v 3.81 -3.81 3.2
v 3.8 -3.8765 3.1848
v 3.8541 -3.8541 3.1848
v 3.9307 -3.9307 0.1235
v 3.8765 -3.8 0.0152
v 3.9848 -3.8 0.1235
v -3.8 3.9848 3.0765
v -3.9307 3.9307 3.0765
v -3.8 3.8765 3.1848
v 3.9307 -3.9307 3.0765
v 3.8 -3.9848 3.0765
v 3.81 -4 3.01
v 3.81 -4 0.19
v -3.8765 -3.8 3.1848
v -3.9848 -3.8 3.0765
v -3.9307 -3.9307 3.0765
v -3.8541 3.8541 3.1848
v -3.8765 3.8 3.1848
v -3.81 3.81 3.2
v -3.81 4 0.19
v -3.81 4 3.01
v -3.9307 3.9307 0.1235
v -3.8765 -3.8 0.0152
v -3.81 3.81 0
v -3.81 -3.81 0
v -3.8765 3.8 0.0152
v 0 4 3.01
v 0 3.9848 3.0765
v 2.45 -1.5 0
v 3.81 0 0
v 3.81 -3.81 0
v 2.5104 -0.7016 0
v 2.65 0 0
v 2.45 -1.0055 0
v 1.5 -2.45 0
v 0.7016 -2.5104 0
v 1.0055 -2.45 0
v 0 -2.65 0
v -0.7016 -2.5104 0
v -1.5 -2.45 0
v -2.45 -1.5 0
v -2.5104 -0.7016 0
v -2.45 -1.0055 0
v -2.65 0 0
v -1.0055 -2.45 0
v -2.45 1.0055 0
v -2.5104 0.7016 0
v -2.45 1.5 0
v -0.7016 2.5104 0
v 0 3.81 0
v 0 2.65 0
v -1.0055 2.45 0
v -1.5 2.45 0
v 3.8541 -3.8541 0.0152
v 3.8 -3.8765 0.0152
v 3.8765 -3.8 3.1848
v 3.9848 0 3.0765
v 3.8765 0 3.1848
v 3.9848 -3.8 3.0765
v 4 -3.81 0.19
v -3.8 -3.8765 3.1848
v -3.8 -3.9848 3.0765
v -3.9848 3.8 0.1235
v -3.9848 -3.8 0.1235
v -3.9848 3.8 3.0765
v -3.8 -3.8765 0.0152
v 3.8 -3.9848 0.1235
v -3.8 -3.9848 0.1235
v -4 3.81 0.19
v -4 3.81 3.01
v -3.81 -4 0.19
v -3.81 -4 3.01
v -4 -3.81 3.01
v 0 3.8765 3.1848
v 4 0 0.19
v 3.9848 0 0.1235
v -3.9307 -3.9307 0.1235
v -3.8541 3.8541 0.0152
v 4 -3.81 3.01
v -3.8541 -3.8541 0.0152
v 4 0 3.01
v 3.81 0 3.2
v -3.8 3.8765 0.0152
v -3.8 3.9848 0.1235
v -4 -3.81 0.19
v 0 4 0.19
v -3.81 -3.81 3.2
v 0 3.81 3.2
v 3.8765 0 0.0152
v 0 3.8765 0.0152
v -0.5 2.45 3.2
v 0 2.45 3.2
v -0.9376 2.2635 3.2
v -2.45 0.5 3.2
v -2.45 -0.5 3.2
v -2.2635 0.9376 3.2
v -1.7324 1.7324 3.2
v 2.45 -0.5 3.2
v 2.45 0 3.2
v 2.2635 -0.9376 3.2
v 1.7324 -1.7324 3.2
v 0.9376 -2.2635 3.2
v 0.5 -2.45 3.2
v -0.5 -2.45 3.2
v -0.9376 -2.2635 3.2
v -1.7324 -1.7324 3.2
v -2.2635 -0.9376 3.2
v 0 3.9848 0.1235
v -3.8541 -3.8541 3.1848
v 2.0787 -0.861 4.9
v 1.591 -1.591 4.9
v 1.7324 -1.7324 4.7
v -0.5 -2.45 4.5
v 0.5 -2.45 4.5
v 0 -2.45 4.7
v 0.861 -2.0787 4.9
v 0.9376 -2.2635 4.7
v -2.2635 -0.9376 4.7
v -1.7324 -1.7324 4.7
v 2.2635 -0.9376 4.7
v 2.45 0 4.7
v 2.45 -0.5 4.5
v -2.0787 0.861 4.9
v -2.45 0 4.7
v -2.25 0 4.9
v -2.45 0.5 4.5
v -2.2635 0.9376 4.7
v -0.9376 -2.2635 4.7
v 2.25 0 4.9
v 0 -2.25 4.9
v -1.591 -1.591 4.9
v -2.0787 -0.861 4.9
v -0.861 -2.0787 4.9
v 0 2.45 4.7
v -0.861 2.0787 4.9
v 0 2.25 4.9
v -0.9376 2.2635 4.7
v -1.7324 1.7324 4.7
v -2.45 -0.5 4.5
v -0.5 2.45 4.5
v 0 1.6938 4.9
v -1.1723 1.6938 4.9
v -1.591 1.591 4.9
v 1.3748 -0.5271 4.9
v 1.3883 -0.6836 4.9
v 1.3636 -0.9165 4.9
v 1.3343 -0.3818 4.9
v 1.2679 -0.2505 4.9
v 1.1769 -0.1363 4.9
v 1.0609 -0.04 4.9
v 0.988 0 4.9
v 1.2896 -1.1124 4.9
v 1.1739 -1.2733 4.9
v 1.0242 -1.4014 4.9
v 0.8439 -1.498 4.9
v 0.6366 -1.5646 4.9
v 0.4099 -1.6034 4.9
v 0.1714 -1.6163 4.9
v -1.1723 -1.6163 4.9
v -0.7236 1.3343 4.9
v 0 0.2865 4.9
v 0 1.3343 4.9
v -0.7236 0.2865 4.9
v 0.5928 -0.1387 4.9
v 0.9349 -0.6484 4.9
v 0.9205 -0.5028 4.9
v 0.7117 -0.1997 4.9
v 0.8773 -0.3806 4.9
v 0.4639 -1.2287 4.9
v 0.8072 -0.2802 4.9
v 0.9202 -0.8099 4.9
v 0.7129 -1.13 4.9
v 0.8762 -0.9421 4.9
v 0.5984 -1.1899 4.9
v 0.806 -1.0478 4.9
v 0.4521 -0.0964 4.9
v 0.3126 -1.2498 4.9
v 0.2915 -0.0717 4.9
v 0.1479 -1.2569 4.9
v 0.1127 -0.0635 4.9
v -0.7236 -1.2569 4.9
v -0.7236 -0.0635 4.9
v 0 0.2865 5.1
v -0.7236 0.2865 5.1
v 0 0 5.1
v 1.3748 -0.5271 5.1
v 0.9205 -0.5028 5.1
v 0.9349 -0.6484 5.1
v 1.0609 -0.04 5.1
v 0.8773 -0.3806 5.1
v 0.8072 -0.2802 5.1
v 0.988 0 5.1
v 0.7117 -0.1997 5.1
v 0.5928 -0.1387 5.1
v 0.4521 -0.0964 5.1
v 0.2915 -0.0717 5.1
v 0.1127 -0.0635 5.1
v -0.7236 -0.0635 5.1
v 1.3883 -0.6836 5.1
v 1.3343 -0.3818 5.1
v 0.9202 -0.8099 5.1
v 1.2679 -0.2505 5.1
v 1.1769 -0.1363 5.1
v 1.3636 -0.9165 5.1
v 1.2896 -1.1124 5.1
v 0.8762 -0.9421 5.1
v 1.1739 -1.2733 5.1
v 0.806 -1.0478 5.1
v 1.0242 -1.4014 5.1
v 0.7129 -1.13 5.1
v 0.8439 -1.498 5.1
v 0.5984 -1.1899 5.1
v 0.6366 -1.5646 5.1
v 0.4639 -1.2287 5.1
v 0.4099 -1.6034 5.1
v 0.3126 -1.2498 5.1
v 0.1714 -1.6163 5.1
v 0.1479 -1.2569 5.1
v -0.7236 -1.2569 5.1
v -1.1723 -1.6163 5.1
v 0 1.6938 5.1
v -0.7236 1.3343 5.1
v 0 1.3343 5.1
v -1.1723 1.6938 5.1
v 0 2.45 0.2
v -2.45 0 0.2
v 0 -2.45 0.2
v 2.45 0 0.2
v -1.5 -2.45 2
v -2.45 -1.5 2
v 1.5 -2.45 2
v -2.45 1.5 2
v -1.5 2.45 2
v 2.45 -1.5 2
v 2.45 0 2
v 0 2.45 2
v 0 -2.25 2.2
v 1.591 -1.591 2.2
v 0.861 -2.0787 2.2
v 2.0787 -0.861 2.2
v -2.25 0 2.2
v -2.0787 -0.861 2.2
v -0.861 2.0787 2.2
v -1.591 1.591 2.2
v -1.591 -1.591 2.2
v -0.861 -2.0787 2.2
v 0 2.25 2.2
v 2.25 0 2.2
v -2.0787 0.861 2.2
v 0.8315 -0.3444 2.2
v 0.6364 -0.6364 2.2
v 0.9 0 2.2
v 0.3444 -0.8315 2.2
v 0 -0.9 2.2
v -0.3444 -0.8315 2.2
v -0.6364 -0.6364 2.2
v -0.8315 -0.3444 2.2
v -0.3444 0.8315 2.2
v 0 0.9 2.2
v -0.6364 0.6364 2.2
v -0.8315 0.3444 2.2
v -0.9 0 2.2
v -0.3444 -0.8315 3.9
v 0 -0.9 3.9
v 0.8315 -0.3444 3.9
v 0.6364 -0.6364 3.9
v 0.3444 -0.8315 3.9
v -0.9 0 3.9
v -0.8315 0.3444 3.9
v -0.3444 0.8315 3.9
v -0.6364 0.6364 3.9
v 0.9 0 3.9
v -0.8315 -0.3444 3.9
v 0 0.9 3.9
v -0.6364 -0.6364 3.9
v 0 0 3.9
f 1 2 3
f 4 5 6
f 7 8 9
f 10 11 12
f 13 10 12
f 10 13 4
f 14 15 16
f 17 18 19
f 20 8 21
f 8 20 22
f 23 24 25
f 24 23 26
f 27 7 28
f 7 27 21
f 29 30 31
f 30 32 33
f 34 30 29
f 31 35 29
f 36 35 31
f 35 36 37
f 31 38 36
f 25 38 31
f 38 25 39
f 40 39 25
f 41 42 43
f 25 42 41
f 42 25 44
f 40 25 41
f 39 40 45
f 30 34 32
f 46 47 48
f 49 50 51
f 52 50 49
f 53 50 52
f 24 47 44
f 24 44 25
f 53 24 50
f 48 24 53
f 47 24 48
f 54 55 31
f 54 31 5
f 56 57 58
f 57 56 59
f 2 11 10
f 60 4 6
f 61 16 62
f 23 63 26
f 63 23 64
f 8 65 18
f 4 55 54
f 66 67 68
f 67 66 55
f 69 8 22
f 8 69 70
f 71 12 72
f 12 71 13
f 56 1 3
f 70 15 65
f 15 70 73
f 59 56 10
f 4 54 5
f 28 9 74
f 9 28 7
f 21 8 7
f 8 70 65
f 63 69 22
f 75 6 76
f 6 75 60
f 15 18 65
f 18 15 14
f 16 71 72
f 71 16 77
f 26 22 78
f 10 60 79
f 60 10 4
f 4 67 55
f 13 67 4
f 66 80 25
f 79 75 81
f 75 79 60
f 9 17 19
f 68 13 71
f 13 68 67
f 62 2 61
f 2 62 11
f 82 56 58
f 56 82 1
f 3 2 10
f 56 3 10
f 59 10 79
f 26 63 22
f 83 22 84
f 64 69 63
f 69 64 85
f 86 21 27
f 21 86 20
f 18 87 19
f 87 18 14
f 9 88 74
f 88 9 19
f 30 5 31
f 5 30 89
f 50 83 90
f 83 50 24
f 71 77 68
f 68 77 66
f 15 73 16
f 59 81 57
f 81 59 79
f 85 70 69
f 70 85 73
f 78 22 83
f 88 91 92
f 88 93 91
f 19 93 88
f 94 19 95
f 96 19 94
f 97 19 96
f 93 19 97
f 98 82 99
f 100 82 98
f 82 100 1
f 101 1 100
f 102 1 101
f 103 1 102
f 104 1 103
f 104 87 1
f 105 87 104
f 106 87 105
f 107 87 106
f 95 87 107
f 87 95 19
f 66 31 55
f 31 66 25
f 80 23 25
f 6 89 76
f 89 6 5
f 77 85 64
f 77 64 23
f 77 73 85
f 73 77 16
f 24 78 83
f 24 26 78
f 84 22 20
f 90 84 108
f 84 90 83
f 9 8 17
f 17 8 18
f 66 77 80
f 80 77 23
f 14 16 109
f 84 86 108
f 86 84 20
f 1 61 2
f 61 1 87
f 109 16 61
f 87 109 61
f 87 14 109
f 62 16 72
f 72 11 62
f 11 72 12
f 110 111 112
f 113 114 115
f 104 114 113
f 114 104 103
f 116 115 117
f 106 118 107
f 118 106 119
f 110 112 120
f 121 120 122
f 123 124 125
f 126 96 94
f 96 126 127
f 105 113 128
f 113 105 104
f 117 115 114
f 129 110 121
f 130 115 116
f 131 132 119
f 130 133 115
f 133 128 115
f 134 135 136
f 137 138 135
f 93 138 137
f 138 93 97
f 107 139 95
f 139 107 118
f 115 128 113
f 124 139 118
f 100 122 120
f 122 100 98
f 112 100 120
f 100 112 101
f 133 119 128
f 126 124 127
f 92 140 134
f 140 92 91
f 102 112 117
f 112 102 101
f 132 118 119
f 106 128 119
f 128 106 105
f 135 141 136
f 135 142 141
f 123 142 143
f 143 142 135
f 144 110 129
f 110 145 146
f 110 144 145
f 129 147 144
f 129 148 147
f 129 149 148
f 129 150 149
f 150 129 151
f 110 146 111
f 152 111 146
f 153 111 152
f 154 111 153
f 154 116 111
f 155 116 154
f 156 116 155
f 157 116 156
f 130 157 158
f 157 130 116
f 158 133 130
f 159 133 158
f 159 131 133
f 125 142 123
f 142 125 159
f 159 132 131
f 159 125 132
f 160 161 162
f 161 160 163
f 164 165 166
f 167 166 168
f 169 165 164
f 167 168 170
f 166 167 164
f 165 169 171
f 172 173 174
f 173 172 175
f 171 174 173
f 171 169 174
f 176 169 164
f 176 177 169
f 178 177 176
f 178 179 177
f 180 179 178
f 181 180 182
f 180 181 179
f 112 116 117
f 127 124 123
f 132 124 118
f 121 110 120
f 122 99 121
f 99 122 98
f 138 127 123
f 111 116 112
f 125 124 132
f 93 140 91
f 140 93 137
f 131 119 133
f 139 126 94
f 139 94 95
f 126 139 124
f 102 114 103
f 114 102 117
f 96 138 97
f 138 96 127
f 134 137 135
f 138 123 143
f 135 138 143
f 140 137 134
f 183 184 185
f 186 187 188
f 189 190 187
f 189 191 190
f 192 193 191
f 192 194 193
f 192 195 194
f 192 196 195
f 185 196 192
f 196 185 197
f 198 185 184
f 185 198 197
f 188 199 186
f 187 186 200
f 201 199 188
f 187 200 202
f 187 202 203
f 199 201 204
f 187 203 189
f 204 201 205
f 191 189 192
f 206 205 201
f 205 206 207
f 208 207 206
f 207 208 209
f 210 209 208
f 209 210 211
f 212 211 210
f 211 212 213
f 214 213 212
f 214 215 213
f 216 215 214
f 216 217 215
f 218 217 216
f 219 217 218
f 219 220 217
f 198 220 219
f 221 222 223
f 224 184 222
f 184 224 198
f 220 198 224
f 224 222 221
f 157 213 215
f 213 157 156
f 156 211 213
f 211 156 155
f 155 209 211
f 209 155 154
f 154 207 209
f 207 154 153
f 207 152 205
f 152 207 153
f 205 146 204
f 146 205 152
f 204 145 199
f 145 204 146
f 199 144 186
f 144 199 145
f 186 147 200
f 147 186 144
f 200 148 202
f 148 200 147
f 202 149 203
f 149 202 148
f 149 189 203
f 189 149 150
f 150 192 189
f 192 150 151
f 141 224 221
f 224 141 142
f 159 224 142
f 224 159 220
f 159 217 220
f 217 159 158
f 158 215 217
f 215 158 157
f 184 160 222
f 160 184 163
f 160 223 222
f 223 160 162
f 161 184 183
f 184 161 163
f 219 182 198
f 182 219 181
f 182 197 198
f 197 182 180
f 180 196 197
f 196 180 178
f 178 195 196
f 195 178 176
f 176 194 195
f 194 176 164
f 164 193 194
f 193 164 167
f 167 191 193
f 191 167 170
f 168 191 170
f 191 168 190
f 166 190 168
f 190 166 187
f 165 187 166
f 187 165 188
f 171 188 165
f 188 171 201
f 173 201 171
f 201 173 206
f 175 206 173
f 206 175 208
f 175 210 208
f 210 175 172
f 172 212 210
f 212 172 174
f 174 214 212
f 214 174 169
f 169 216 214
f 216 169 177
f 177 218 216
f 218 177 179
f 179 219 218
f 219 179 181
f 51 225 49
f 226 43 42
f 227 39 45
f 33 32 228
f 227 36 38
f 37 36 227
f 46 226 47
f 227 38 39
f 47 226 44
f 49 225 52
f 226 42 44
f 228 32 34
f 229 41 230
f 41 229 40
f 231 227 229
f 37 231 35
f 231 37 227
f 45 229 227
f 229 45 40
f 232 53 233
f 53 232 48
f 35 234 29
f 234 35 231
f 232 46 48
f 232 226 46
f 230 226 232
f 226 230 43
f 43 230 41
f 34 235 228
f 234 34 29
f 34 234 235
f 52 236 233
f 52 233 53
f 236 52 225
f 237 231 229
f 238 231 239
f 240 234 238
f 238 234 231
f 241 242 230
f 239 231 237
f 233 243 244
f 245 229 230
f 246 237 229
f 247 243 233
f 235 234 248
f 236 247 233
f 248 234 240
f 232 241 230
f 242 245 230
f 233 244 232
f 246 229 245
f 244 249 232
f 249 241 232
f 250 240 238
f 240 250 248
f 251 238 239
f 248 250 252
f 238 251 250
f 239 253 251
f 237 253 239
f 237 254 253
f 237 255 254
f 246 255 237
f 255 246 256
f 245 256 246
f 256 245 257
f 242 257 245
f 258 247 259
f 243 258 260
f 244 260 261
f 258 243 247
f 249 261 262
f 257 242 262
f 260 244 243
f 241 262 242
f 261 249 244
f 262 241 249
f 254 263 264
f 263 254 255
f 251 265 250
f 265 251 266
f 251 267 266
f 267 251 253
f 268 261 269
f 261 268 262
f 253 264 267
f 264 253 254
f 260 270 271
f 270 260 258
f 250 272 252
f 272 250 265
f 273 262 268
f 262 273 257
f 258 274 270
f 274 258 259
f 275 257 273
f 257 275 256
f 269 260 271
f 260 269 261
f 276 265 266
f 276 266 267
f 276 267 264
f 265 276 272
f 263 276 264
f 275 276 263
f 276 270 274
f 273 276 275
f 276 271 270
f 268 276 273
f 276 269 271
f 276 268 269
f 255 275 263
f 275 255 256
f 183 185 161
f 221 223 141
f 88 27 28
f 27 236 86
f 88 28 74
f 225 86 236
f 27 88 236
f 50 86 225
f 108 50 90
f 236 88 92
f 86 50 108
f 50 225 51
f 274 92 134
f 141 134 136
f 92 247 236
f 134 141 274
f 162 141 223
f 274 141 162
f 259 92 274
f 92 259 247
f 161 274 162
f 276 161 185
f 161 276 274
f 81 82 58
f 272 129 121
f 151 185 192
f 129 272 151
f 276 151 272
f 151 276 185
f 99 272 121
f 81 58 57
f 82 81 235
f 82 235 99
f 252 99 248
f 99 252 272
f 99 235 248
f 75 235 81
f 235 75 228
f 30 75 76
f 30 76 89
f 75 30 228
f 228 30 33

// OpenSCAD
// file: lcbm_corner_bevel.scad
// Lego Compatible Build Modules

module lcbm_corner_bevel(bevel=0.2,flat=0.0) {
    local_flat=(flat>0.0&&flat<=bevel)?flat:0.1*bevel;
    hull() {
        sphere(r=bevel,$fn=8);
        cube([2*bevel,local_flat,local_flat],center=true);
        cube([local_flat,2*bevel,local_flat],center=true);
        cube([local_flat,local_flat,2*bevel],center=true);
    }
}
// file: lcbm_block_body.scad
// Lego Compatible Build Modules

use <lcbm_corner_bevel.scad>;
test_module="test lcbm_block_body";

module lcbm_block_body(unit=[8.0,8.0,10.0/3.0],size=[1,1,1],bevel=0.2,flat=0.0,center=true,shrink=0.0) {
    offset_x=(center)?-size[0]*unit[0]/2:0.0;
    offset_y=(center)?-size[1]*unit[1]/2:0.0;
    translate([offset_x,offset_y]) hull() {
        translate([bevel+shrink/2,bevel+shrink/2,0]) {
            translate([0,0,bevel]) lcbm_corner_bevel(bevel=bevel,flat=flat);
            translate([0,0,unit[2]*size[2]-bevel]) lcbm_corner_bevel(bevel=bevel,flat=flat);
        }
        translate([unit[0]*size[0]-bevel-shrink/2,bevel+shrink/2,0]) {
            translate([0,0,bevel]) lcbm_corner_bevel(bevel=bevel,flat=flat);
            translate([0,0,unit[2]*size[2]-bevel]) lcbm_corner_bevel(bevel=bevel,flat=flat);
        }
        translate([bevel+shrink/2,unit[1]*size[1]-bevel-shrink/2,0]) {
            translate([0,0,bevel]) lcbm_corner_bevel(bevel=bevel,flat=flat);
            translate([0,0,unit[2]*size[2]-bevel]) lcbm_corner_bevel(bevel=bevel,flat=flat);
        }
        translate([unit[0]*size[0]-bevel-shrink/2,unit[1]*size[1]-bevel-shrink/2,0]) {
            translate([0,0,bevel]) lcbm_corner_bevel(bevel=bevel,flat=flat);
            translate([0,0,unit[2]*size[2]-bevel]) lcbm_corner_bevel(bevel=bevel,flat=flat);
        }
    }
}

if(test_module=="test lcbm_block_body") {
    echo("Testing lcbm_block_body...");
    lcbm_block_body(size=[1,2,1],center=false,shrink=0.25);
    %cube([8,16,10/3],center=false);
}
// file: lcbm_socket_hole.scad
// Lego Compatible Build Modules

test_module="test lcbm_socket_hole";

module lcbm_socket_hole(socket_d=4.9, socket_h=2.0, socket_bevel=0.2, socket_base_ext=0.1, socket_hole_d=1.8, socket_hole_h=3.3,socket_hole_bevel=0.1,flat_side_w=1.5) {
    $fn=16;
        render() {
            union() {
                translate([0,0,-socket_base_ext]) cylinder(r1=socket_base_ext+socket_d/2+socket_bevel,r2=socket_d/2,h=socket_base_ext+socket_bevel);
                if(flat_side_w>0.0) {
                    hull() translate([0,0,-socket_base_ext/2]) {
                        cube([flat_side_w,socket_d,socket_base_ext],center=true);
                        cube([socket_d,flat_side_w,socket_base_ext],center=true);
                    }
                }
            }
            hull() {
                cylinder(r=socket_d/2,h=socket_h-socket_bevel);
                if(flat_side_w>0.0) {
                    translate([0,0,socket_h/2-socket_bevel/2]) {
                        cube([flat_side_w,socket_d,socket_h-socket_bevel],center=true);
                        cube([socket_d,flat_side_w,socket_h-socket_bevel],center=true);
                    }
                }
                if(socket_bevel>0.0) {
                    translate([0,0,socket_h-socket_bevel]) cylinder(r1=socket_d/2,r2=socket_d/2-socket_bevel,h=socket_bevel);
                }
            }
            if(socket_hole_d>0.0) {
                cylinder(r=socket_hole_d/2,h=socket_hole_h);
                translate([0,0,socket_h]) cylinder(r1=socket_hole_d/2+2*socket_hole_bevel,r2=socket_hole_d/2,h=2*socket_hole_bevel,center=true);
                if(socket_hole_bevel>0.0) {
                    translate([0,0,socket_hole_h-socket_hole_bevel]) cylinder(r1=socket_hole_d/2,r2=socket_hole_d/2+socket_hole_bevel,h=socket_hole_bevel,center=false);
                }
            }
        }
}

if(test_module=="test lcbm_socket_hole") {
    echo("Testing lcbm_socket_hole...");
    lcbm_socket_hole(flat_side_w=1.0);
}
// file: lcbm_peg.scad
// Lego Compatible Build Modules

test_module="test lcbm_peg";

module lcbm_peg(peg_d=4.9,peg_h=1.8,peg_bevel=0.2,peg_base_ext=0.1,peg_hole_d=1.8,peg_hole_bevel=0.1,flat_side_w=1.0) {
    $fn=16;
    render() difference() {
        hull() {
            translate([0,0,-peg_base_ext]) cylinder(r=peg_d/2,h=peg_base_ext+peg_h-peg_bevel);
            if(flat_side_w>0.0) {
                translate([0,0,peg_h/2-peg_bevel]) {
                    cube([flat_side_w,peg_d,peg_h-2*peg_bevel],center=true);
                    cube([peg_d,flat_side_w,peg_h-2*peg_bevel],center=true);
                }
            }
            if(peg_bevel>0.0) {
                translate([0,0,peg_h-peg_bevel]) cylinder(r1=peg_d/2,r2=peg_d/2-peg_bevel,h=peg_bevel);
            }
        }
        if(peg_hole_d>0.0) {
            translate([0,0,-peg_base_ext]) {
                cylinder(r=peg_hole_d/2,h=peg_base_ext+peg_h);
            }
            if(peg_hole_bevel>0.0) {
                translate([0,0,-peg_base_ext]) cylinder(r1=peg_hole_d/2+peg_hole_bevel,r2=peg_hole_d/2,h=peg_hole_bevel);
                translate([0,0,peg_h-peg_hole_bevel]) cylinder(r1=peg_hole_d/2,r2=peg_hole_d/2+peg_hole_bevel,h=peg_hole_bevel);
            }
        }
    }
}

if(test_module=="test lcbm_peg") {
    echo("Testing lcbm_peg...");
    lcbm_peg();
}
// main file
// Lego Compatible Build Modules

use <lcbm_peg.scad>;
use <lcbm_socket_hole.scad>;
//use <lcbm_corner_bevel.scad>;
use <lcbm_block_body.scad>;
test_module="test lcbm_letter_peg";

module lcbm_letter_peg(letter="A",letter_h=0.2,letter_size=0.707*4.9,block_h=3.2,block_w=8.0,block_bevel=0.2,peg_h=1.7,min_wall_th=1.0) {
    difference() {
        union() {
            lcbm_block_body(unit=[block_w,block_w,block_h],bevel=block_bevel,center=true);
            translate([0,0,block_h]) lcbm_peg(peg_h=peg_h,peg_hole_d=0);
            translate([0,0,block_h+peg_h]) {
                linear_extrude(height=2*letter_h,center=true) text(letter,halign="center",valign="center",size=letter_size);
            }
        }
        lcbm_socket_hole(socket_h=block_h-min_wall_th,socket_hole_h=block_h+peg_h-min_wall_th,socket_hole_bevel=0,flat_side_w=3.0);
    }
}

if(test_module=="test lcbm_letter_peg") {
    echo("Testing lcbm_letter_peg...");
    difference() {
        lcbm_letter_peg("B");
        cube([10,10,10]);
    }
}
